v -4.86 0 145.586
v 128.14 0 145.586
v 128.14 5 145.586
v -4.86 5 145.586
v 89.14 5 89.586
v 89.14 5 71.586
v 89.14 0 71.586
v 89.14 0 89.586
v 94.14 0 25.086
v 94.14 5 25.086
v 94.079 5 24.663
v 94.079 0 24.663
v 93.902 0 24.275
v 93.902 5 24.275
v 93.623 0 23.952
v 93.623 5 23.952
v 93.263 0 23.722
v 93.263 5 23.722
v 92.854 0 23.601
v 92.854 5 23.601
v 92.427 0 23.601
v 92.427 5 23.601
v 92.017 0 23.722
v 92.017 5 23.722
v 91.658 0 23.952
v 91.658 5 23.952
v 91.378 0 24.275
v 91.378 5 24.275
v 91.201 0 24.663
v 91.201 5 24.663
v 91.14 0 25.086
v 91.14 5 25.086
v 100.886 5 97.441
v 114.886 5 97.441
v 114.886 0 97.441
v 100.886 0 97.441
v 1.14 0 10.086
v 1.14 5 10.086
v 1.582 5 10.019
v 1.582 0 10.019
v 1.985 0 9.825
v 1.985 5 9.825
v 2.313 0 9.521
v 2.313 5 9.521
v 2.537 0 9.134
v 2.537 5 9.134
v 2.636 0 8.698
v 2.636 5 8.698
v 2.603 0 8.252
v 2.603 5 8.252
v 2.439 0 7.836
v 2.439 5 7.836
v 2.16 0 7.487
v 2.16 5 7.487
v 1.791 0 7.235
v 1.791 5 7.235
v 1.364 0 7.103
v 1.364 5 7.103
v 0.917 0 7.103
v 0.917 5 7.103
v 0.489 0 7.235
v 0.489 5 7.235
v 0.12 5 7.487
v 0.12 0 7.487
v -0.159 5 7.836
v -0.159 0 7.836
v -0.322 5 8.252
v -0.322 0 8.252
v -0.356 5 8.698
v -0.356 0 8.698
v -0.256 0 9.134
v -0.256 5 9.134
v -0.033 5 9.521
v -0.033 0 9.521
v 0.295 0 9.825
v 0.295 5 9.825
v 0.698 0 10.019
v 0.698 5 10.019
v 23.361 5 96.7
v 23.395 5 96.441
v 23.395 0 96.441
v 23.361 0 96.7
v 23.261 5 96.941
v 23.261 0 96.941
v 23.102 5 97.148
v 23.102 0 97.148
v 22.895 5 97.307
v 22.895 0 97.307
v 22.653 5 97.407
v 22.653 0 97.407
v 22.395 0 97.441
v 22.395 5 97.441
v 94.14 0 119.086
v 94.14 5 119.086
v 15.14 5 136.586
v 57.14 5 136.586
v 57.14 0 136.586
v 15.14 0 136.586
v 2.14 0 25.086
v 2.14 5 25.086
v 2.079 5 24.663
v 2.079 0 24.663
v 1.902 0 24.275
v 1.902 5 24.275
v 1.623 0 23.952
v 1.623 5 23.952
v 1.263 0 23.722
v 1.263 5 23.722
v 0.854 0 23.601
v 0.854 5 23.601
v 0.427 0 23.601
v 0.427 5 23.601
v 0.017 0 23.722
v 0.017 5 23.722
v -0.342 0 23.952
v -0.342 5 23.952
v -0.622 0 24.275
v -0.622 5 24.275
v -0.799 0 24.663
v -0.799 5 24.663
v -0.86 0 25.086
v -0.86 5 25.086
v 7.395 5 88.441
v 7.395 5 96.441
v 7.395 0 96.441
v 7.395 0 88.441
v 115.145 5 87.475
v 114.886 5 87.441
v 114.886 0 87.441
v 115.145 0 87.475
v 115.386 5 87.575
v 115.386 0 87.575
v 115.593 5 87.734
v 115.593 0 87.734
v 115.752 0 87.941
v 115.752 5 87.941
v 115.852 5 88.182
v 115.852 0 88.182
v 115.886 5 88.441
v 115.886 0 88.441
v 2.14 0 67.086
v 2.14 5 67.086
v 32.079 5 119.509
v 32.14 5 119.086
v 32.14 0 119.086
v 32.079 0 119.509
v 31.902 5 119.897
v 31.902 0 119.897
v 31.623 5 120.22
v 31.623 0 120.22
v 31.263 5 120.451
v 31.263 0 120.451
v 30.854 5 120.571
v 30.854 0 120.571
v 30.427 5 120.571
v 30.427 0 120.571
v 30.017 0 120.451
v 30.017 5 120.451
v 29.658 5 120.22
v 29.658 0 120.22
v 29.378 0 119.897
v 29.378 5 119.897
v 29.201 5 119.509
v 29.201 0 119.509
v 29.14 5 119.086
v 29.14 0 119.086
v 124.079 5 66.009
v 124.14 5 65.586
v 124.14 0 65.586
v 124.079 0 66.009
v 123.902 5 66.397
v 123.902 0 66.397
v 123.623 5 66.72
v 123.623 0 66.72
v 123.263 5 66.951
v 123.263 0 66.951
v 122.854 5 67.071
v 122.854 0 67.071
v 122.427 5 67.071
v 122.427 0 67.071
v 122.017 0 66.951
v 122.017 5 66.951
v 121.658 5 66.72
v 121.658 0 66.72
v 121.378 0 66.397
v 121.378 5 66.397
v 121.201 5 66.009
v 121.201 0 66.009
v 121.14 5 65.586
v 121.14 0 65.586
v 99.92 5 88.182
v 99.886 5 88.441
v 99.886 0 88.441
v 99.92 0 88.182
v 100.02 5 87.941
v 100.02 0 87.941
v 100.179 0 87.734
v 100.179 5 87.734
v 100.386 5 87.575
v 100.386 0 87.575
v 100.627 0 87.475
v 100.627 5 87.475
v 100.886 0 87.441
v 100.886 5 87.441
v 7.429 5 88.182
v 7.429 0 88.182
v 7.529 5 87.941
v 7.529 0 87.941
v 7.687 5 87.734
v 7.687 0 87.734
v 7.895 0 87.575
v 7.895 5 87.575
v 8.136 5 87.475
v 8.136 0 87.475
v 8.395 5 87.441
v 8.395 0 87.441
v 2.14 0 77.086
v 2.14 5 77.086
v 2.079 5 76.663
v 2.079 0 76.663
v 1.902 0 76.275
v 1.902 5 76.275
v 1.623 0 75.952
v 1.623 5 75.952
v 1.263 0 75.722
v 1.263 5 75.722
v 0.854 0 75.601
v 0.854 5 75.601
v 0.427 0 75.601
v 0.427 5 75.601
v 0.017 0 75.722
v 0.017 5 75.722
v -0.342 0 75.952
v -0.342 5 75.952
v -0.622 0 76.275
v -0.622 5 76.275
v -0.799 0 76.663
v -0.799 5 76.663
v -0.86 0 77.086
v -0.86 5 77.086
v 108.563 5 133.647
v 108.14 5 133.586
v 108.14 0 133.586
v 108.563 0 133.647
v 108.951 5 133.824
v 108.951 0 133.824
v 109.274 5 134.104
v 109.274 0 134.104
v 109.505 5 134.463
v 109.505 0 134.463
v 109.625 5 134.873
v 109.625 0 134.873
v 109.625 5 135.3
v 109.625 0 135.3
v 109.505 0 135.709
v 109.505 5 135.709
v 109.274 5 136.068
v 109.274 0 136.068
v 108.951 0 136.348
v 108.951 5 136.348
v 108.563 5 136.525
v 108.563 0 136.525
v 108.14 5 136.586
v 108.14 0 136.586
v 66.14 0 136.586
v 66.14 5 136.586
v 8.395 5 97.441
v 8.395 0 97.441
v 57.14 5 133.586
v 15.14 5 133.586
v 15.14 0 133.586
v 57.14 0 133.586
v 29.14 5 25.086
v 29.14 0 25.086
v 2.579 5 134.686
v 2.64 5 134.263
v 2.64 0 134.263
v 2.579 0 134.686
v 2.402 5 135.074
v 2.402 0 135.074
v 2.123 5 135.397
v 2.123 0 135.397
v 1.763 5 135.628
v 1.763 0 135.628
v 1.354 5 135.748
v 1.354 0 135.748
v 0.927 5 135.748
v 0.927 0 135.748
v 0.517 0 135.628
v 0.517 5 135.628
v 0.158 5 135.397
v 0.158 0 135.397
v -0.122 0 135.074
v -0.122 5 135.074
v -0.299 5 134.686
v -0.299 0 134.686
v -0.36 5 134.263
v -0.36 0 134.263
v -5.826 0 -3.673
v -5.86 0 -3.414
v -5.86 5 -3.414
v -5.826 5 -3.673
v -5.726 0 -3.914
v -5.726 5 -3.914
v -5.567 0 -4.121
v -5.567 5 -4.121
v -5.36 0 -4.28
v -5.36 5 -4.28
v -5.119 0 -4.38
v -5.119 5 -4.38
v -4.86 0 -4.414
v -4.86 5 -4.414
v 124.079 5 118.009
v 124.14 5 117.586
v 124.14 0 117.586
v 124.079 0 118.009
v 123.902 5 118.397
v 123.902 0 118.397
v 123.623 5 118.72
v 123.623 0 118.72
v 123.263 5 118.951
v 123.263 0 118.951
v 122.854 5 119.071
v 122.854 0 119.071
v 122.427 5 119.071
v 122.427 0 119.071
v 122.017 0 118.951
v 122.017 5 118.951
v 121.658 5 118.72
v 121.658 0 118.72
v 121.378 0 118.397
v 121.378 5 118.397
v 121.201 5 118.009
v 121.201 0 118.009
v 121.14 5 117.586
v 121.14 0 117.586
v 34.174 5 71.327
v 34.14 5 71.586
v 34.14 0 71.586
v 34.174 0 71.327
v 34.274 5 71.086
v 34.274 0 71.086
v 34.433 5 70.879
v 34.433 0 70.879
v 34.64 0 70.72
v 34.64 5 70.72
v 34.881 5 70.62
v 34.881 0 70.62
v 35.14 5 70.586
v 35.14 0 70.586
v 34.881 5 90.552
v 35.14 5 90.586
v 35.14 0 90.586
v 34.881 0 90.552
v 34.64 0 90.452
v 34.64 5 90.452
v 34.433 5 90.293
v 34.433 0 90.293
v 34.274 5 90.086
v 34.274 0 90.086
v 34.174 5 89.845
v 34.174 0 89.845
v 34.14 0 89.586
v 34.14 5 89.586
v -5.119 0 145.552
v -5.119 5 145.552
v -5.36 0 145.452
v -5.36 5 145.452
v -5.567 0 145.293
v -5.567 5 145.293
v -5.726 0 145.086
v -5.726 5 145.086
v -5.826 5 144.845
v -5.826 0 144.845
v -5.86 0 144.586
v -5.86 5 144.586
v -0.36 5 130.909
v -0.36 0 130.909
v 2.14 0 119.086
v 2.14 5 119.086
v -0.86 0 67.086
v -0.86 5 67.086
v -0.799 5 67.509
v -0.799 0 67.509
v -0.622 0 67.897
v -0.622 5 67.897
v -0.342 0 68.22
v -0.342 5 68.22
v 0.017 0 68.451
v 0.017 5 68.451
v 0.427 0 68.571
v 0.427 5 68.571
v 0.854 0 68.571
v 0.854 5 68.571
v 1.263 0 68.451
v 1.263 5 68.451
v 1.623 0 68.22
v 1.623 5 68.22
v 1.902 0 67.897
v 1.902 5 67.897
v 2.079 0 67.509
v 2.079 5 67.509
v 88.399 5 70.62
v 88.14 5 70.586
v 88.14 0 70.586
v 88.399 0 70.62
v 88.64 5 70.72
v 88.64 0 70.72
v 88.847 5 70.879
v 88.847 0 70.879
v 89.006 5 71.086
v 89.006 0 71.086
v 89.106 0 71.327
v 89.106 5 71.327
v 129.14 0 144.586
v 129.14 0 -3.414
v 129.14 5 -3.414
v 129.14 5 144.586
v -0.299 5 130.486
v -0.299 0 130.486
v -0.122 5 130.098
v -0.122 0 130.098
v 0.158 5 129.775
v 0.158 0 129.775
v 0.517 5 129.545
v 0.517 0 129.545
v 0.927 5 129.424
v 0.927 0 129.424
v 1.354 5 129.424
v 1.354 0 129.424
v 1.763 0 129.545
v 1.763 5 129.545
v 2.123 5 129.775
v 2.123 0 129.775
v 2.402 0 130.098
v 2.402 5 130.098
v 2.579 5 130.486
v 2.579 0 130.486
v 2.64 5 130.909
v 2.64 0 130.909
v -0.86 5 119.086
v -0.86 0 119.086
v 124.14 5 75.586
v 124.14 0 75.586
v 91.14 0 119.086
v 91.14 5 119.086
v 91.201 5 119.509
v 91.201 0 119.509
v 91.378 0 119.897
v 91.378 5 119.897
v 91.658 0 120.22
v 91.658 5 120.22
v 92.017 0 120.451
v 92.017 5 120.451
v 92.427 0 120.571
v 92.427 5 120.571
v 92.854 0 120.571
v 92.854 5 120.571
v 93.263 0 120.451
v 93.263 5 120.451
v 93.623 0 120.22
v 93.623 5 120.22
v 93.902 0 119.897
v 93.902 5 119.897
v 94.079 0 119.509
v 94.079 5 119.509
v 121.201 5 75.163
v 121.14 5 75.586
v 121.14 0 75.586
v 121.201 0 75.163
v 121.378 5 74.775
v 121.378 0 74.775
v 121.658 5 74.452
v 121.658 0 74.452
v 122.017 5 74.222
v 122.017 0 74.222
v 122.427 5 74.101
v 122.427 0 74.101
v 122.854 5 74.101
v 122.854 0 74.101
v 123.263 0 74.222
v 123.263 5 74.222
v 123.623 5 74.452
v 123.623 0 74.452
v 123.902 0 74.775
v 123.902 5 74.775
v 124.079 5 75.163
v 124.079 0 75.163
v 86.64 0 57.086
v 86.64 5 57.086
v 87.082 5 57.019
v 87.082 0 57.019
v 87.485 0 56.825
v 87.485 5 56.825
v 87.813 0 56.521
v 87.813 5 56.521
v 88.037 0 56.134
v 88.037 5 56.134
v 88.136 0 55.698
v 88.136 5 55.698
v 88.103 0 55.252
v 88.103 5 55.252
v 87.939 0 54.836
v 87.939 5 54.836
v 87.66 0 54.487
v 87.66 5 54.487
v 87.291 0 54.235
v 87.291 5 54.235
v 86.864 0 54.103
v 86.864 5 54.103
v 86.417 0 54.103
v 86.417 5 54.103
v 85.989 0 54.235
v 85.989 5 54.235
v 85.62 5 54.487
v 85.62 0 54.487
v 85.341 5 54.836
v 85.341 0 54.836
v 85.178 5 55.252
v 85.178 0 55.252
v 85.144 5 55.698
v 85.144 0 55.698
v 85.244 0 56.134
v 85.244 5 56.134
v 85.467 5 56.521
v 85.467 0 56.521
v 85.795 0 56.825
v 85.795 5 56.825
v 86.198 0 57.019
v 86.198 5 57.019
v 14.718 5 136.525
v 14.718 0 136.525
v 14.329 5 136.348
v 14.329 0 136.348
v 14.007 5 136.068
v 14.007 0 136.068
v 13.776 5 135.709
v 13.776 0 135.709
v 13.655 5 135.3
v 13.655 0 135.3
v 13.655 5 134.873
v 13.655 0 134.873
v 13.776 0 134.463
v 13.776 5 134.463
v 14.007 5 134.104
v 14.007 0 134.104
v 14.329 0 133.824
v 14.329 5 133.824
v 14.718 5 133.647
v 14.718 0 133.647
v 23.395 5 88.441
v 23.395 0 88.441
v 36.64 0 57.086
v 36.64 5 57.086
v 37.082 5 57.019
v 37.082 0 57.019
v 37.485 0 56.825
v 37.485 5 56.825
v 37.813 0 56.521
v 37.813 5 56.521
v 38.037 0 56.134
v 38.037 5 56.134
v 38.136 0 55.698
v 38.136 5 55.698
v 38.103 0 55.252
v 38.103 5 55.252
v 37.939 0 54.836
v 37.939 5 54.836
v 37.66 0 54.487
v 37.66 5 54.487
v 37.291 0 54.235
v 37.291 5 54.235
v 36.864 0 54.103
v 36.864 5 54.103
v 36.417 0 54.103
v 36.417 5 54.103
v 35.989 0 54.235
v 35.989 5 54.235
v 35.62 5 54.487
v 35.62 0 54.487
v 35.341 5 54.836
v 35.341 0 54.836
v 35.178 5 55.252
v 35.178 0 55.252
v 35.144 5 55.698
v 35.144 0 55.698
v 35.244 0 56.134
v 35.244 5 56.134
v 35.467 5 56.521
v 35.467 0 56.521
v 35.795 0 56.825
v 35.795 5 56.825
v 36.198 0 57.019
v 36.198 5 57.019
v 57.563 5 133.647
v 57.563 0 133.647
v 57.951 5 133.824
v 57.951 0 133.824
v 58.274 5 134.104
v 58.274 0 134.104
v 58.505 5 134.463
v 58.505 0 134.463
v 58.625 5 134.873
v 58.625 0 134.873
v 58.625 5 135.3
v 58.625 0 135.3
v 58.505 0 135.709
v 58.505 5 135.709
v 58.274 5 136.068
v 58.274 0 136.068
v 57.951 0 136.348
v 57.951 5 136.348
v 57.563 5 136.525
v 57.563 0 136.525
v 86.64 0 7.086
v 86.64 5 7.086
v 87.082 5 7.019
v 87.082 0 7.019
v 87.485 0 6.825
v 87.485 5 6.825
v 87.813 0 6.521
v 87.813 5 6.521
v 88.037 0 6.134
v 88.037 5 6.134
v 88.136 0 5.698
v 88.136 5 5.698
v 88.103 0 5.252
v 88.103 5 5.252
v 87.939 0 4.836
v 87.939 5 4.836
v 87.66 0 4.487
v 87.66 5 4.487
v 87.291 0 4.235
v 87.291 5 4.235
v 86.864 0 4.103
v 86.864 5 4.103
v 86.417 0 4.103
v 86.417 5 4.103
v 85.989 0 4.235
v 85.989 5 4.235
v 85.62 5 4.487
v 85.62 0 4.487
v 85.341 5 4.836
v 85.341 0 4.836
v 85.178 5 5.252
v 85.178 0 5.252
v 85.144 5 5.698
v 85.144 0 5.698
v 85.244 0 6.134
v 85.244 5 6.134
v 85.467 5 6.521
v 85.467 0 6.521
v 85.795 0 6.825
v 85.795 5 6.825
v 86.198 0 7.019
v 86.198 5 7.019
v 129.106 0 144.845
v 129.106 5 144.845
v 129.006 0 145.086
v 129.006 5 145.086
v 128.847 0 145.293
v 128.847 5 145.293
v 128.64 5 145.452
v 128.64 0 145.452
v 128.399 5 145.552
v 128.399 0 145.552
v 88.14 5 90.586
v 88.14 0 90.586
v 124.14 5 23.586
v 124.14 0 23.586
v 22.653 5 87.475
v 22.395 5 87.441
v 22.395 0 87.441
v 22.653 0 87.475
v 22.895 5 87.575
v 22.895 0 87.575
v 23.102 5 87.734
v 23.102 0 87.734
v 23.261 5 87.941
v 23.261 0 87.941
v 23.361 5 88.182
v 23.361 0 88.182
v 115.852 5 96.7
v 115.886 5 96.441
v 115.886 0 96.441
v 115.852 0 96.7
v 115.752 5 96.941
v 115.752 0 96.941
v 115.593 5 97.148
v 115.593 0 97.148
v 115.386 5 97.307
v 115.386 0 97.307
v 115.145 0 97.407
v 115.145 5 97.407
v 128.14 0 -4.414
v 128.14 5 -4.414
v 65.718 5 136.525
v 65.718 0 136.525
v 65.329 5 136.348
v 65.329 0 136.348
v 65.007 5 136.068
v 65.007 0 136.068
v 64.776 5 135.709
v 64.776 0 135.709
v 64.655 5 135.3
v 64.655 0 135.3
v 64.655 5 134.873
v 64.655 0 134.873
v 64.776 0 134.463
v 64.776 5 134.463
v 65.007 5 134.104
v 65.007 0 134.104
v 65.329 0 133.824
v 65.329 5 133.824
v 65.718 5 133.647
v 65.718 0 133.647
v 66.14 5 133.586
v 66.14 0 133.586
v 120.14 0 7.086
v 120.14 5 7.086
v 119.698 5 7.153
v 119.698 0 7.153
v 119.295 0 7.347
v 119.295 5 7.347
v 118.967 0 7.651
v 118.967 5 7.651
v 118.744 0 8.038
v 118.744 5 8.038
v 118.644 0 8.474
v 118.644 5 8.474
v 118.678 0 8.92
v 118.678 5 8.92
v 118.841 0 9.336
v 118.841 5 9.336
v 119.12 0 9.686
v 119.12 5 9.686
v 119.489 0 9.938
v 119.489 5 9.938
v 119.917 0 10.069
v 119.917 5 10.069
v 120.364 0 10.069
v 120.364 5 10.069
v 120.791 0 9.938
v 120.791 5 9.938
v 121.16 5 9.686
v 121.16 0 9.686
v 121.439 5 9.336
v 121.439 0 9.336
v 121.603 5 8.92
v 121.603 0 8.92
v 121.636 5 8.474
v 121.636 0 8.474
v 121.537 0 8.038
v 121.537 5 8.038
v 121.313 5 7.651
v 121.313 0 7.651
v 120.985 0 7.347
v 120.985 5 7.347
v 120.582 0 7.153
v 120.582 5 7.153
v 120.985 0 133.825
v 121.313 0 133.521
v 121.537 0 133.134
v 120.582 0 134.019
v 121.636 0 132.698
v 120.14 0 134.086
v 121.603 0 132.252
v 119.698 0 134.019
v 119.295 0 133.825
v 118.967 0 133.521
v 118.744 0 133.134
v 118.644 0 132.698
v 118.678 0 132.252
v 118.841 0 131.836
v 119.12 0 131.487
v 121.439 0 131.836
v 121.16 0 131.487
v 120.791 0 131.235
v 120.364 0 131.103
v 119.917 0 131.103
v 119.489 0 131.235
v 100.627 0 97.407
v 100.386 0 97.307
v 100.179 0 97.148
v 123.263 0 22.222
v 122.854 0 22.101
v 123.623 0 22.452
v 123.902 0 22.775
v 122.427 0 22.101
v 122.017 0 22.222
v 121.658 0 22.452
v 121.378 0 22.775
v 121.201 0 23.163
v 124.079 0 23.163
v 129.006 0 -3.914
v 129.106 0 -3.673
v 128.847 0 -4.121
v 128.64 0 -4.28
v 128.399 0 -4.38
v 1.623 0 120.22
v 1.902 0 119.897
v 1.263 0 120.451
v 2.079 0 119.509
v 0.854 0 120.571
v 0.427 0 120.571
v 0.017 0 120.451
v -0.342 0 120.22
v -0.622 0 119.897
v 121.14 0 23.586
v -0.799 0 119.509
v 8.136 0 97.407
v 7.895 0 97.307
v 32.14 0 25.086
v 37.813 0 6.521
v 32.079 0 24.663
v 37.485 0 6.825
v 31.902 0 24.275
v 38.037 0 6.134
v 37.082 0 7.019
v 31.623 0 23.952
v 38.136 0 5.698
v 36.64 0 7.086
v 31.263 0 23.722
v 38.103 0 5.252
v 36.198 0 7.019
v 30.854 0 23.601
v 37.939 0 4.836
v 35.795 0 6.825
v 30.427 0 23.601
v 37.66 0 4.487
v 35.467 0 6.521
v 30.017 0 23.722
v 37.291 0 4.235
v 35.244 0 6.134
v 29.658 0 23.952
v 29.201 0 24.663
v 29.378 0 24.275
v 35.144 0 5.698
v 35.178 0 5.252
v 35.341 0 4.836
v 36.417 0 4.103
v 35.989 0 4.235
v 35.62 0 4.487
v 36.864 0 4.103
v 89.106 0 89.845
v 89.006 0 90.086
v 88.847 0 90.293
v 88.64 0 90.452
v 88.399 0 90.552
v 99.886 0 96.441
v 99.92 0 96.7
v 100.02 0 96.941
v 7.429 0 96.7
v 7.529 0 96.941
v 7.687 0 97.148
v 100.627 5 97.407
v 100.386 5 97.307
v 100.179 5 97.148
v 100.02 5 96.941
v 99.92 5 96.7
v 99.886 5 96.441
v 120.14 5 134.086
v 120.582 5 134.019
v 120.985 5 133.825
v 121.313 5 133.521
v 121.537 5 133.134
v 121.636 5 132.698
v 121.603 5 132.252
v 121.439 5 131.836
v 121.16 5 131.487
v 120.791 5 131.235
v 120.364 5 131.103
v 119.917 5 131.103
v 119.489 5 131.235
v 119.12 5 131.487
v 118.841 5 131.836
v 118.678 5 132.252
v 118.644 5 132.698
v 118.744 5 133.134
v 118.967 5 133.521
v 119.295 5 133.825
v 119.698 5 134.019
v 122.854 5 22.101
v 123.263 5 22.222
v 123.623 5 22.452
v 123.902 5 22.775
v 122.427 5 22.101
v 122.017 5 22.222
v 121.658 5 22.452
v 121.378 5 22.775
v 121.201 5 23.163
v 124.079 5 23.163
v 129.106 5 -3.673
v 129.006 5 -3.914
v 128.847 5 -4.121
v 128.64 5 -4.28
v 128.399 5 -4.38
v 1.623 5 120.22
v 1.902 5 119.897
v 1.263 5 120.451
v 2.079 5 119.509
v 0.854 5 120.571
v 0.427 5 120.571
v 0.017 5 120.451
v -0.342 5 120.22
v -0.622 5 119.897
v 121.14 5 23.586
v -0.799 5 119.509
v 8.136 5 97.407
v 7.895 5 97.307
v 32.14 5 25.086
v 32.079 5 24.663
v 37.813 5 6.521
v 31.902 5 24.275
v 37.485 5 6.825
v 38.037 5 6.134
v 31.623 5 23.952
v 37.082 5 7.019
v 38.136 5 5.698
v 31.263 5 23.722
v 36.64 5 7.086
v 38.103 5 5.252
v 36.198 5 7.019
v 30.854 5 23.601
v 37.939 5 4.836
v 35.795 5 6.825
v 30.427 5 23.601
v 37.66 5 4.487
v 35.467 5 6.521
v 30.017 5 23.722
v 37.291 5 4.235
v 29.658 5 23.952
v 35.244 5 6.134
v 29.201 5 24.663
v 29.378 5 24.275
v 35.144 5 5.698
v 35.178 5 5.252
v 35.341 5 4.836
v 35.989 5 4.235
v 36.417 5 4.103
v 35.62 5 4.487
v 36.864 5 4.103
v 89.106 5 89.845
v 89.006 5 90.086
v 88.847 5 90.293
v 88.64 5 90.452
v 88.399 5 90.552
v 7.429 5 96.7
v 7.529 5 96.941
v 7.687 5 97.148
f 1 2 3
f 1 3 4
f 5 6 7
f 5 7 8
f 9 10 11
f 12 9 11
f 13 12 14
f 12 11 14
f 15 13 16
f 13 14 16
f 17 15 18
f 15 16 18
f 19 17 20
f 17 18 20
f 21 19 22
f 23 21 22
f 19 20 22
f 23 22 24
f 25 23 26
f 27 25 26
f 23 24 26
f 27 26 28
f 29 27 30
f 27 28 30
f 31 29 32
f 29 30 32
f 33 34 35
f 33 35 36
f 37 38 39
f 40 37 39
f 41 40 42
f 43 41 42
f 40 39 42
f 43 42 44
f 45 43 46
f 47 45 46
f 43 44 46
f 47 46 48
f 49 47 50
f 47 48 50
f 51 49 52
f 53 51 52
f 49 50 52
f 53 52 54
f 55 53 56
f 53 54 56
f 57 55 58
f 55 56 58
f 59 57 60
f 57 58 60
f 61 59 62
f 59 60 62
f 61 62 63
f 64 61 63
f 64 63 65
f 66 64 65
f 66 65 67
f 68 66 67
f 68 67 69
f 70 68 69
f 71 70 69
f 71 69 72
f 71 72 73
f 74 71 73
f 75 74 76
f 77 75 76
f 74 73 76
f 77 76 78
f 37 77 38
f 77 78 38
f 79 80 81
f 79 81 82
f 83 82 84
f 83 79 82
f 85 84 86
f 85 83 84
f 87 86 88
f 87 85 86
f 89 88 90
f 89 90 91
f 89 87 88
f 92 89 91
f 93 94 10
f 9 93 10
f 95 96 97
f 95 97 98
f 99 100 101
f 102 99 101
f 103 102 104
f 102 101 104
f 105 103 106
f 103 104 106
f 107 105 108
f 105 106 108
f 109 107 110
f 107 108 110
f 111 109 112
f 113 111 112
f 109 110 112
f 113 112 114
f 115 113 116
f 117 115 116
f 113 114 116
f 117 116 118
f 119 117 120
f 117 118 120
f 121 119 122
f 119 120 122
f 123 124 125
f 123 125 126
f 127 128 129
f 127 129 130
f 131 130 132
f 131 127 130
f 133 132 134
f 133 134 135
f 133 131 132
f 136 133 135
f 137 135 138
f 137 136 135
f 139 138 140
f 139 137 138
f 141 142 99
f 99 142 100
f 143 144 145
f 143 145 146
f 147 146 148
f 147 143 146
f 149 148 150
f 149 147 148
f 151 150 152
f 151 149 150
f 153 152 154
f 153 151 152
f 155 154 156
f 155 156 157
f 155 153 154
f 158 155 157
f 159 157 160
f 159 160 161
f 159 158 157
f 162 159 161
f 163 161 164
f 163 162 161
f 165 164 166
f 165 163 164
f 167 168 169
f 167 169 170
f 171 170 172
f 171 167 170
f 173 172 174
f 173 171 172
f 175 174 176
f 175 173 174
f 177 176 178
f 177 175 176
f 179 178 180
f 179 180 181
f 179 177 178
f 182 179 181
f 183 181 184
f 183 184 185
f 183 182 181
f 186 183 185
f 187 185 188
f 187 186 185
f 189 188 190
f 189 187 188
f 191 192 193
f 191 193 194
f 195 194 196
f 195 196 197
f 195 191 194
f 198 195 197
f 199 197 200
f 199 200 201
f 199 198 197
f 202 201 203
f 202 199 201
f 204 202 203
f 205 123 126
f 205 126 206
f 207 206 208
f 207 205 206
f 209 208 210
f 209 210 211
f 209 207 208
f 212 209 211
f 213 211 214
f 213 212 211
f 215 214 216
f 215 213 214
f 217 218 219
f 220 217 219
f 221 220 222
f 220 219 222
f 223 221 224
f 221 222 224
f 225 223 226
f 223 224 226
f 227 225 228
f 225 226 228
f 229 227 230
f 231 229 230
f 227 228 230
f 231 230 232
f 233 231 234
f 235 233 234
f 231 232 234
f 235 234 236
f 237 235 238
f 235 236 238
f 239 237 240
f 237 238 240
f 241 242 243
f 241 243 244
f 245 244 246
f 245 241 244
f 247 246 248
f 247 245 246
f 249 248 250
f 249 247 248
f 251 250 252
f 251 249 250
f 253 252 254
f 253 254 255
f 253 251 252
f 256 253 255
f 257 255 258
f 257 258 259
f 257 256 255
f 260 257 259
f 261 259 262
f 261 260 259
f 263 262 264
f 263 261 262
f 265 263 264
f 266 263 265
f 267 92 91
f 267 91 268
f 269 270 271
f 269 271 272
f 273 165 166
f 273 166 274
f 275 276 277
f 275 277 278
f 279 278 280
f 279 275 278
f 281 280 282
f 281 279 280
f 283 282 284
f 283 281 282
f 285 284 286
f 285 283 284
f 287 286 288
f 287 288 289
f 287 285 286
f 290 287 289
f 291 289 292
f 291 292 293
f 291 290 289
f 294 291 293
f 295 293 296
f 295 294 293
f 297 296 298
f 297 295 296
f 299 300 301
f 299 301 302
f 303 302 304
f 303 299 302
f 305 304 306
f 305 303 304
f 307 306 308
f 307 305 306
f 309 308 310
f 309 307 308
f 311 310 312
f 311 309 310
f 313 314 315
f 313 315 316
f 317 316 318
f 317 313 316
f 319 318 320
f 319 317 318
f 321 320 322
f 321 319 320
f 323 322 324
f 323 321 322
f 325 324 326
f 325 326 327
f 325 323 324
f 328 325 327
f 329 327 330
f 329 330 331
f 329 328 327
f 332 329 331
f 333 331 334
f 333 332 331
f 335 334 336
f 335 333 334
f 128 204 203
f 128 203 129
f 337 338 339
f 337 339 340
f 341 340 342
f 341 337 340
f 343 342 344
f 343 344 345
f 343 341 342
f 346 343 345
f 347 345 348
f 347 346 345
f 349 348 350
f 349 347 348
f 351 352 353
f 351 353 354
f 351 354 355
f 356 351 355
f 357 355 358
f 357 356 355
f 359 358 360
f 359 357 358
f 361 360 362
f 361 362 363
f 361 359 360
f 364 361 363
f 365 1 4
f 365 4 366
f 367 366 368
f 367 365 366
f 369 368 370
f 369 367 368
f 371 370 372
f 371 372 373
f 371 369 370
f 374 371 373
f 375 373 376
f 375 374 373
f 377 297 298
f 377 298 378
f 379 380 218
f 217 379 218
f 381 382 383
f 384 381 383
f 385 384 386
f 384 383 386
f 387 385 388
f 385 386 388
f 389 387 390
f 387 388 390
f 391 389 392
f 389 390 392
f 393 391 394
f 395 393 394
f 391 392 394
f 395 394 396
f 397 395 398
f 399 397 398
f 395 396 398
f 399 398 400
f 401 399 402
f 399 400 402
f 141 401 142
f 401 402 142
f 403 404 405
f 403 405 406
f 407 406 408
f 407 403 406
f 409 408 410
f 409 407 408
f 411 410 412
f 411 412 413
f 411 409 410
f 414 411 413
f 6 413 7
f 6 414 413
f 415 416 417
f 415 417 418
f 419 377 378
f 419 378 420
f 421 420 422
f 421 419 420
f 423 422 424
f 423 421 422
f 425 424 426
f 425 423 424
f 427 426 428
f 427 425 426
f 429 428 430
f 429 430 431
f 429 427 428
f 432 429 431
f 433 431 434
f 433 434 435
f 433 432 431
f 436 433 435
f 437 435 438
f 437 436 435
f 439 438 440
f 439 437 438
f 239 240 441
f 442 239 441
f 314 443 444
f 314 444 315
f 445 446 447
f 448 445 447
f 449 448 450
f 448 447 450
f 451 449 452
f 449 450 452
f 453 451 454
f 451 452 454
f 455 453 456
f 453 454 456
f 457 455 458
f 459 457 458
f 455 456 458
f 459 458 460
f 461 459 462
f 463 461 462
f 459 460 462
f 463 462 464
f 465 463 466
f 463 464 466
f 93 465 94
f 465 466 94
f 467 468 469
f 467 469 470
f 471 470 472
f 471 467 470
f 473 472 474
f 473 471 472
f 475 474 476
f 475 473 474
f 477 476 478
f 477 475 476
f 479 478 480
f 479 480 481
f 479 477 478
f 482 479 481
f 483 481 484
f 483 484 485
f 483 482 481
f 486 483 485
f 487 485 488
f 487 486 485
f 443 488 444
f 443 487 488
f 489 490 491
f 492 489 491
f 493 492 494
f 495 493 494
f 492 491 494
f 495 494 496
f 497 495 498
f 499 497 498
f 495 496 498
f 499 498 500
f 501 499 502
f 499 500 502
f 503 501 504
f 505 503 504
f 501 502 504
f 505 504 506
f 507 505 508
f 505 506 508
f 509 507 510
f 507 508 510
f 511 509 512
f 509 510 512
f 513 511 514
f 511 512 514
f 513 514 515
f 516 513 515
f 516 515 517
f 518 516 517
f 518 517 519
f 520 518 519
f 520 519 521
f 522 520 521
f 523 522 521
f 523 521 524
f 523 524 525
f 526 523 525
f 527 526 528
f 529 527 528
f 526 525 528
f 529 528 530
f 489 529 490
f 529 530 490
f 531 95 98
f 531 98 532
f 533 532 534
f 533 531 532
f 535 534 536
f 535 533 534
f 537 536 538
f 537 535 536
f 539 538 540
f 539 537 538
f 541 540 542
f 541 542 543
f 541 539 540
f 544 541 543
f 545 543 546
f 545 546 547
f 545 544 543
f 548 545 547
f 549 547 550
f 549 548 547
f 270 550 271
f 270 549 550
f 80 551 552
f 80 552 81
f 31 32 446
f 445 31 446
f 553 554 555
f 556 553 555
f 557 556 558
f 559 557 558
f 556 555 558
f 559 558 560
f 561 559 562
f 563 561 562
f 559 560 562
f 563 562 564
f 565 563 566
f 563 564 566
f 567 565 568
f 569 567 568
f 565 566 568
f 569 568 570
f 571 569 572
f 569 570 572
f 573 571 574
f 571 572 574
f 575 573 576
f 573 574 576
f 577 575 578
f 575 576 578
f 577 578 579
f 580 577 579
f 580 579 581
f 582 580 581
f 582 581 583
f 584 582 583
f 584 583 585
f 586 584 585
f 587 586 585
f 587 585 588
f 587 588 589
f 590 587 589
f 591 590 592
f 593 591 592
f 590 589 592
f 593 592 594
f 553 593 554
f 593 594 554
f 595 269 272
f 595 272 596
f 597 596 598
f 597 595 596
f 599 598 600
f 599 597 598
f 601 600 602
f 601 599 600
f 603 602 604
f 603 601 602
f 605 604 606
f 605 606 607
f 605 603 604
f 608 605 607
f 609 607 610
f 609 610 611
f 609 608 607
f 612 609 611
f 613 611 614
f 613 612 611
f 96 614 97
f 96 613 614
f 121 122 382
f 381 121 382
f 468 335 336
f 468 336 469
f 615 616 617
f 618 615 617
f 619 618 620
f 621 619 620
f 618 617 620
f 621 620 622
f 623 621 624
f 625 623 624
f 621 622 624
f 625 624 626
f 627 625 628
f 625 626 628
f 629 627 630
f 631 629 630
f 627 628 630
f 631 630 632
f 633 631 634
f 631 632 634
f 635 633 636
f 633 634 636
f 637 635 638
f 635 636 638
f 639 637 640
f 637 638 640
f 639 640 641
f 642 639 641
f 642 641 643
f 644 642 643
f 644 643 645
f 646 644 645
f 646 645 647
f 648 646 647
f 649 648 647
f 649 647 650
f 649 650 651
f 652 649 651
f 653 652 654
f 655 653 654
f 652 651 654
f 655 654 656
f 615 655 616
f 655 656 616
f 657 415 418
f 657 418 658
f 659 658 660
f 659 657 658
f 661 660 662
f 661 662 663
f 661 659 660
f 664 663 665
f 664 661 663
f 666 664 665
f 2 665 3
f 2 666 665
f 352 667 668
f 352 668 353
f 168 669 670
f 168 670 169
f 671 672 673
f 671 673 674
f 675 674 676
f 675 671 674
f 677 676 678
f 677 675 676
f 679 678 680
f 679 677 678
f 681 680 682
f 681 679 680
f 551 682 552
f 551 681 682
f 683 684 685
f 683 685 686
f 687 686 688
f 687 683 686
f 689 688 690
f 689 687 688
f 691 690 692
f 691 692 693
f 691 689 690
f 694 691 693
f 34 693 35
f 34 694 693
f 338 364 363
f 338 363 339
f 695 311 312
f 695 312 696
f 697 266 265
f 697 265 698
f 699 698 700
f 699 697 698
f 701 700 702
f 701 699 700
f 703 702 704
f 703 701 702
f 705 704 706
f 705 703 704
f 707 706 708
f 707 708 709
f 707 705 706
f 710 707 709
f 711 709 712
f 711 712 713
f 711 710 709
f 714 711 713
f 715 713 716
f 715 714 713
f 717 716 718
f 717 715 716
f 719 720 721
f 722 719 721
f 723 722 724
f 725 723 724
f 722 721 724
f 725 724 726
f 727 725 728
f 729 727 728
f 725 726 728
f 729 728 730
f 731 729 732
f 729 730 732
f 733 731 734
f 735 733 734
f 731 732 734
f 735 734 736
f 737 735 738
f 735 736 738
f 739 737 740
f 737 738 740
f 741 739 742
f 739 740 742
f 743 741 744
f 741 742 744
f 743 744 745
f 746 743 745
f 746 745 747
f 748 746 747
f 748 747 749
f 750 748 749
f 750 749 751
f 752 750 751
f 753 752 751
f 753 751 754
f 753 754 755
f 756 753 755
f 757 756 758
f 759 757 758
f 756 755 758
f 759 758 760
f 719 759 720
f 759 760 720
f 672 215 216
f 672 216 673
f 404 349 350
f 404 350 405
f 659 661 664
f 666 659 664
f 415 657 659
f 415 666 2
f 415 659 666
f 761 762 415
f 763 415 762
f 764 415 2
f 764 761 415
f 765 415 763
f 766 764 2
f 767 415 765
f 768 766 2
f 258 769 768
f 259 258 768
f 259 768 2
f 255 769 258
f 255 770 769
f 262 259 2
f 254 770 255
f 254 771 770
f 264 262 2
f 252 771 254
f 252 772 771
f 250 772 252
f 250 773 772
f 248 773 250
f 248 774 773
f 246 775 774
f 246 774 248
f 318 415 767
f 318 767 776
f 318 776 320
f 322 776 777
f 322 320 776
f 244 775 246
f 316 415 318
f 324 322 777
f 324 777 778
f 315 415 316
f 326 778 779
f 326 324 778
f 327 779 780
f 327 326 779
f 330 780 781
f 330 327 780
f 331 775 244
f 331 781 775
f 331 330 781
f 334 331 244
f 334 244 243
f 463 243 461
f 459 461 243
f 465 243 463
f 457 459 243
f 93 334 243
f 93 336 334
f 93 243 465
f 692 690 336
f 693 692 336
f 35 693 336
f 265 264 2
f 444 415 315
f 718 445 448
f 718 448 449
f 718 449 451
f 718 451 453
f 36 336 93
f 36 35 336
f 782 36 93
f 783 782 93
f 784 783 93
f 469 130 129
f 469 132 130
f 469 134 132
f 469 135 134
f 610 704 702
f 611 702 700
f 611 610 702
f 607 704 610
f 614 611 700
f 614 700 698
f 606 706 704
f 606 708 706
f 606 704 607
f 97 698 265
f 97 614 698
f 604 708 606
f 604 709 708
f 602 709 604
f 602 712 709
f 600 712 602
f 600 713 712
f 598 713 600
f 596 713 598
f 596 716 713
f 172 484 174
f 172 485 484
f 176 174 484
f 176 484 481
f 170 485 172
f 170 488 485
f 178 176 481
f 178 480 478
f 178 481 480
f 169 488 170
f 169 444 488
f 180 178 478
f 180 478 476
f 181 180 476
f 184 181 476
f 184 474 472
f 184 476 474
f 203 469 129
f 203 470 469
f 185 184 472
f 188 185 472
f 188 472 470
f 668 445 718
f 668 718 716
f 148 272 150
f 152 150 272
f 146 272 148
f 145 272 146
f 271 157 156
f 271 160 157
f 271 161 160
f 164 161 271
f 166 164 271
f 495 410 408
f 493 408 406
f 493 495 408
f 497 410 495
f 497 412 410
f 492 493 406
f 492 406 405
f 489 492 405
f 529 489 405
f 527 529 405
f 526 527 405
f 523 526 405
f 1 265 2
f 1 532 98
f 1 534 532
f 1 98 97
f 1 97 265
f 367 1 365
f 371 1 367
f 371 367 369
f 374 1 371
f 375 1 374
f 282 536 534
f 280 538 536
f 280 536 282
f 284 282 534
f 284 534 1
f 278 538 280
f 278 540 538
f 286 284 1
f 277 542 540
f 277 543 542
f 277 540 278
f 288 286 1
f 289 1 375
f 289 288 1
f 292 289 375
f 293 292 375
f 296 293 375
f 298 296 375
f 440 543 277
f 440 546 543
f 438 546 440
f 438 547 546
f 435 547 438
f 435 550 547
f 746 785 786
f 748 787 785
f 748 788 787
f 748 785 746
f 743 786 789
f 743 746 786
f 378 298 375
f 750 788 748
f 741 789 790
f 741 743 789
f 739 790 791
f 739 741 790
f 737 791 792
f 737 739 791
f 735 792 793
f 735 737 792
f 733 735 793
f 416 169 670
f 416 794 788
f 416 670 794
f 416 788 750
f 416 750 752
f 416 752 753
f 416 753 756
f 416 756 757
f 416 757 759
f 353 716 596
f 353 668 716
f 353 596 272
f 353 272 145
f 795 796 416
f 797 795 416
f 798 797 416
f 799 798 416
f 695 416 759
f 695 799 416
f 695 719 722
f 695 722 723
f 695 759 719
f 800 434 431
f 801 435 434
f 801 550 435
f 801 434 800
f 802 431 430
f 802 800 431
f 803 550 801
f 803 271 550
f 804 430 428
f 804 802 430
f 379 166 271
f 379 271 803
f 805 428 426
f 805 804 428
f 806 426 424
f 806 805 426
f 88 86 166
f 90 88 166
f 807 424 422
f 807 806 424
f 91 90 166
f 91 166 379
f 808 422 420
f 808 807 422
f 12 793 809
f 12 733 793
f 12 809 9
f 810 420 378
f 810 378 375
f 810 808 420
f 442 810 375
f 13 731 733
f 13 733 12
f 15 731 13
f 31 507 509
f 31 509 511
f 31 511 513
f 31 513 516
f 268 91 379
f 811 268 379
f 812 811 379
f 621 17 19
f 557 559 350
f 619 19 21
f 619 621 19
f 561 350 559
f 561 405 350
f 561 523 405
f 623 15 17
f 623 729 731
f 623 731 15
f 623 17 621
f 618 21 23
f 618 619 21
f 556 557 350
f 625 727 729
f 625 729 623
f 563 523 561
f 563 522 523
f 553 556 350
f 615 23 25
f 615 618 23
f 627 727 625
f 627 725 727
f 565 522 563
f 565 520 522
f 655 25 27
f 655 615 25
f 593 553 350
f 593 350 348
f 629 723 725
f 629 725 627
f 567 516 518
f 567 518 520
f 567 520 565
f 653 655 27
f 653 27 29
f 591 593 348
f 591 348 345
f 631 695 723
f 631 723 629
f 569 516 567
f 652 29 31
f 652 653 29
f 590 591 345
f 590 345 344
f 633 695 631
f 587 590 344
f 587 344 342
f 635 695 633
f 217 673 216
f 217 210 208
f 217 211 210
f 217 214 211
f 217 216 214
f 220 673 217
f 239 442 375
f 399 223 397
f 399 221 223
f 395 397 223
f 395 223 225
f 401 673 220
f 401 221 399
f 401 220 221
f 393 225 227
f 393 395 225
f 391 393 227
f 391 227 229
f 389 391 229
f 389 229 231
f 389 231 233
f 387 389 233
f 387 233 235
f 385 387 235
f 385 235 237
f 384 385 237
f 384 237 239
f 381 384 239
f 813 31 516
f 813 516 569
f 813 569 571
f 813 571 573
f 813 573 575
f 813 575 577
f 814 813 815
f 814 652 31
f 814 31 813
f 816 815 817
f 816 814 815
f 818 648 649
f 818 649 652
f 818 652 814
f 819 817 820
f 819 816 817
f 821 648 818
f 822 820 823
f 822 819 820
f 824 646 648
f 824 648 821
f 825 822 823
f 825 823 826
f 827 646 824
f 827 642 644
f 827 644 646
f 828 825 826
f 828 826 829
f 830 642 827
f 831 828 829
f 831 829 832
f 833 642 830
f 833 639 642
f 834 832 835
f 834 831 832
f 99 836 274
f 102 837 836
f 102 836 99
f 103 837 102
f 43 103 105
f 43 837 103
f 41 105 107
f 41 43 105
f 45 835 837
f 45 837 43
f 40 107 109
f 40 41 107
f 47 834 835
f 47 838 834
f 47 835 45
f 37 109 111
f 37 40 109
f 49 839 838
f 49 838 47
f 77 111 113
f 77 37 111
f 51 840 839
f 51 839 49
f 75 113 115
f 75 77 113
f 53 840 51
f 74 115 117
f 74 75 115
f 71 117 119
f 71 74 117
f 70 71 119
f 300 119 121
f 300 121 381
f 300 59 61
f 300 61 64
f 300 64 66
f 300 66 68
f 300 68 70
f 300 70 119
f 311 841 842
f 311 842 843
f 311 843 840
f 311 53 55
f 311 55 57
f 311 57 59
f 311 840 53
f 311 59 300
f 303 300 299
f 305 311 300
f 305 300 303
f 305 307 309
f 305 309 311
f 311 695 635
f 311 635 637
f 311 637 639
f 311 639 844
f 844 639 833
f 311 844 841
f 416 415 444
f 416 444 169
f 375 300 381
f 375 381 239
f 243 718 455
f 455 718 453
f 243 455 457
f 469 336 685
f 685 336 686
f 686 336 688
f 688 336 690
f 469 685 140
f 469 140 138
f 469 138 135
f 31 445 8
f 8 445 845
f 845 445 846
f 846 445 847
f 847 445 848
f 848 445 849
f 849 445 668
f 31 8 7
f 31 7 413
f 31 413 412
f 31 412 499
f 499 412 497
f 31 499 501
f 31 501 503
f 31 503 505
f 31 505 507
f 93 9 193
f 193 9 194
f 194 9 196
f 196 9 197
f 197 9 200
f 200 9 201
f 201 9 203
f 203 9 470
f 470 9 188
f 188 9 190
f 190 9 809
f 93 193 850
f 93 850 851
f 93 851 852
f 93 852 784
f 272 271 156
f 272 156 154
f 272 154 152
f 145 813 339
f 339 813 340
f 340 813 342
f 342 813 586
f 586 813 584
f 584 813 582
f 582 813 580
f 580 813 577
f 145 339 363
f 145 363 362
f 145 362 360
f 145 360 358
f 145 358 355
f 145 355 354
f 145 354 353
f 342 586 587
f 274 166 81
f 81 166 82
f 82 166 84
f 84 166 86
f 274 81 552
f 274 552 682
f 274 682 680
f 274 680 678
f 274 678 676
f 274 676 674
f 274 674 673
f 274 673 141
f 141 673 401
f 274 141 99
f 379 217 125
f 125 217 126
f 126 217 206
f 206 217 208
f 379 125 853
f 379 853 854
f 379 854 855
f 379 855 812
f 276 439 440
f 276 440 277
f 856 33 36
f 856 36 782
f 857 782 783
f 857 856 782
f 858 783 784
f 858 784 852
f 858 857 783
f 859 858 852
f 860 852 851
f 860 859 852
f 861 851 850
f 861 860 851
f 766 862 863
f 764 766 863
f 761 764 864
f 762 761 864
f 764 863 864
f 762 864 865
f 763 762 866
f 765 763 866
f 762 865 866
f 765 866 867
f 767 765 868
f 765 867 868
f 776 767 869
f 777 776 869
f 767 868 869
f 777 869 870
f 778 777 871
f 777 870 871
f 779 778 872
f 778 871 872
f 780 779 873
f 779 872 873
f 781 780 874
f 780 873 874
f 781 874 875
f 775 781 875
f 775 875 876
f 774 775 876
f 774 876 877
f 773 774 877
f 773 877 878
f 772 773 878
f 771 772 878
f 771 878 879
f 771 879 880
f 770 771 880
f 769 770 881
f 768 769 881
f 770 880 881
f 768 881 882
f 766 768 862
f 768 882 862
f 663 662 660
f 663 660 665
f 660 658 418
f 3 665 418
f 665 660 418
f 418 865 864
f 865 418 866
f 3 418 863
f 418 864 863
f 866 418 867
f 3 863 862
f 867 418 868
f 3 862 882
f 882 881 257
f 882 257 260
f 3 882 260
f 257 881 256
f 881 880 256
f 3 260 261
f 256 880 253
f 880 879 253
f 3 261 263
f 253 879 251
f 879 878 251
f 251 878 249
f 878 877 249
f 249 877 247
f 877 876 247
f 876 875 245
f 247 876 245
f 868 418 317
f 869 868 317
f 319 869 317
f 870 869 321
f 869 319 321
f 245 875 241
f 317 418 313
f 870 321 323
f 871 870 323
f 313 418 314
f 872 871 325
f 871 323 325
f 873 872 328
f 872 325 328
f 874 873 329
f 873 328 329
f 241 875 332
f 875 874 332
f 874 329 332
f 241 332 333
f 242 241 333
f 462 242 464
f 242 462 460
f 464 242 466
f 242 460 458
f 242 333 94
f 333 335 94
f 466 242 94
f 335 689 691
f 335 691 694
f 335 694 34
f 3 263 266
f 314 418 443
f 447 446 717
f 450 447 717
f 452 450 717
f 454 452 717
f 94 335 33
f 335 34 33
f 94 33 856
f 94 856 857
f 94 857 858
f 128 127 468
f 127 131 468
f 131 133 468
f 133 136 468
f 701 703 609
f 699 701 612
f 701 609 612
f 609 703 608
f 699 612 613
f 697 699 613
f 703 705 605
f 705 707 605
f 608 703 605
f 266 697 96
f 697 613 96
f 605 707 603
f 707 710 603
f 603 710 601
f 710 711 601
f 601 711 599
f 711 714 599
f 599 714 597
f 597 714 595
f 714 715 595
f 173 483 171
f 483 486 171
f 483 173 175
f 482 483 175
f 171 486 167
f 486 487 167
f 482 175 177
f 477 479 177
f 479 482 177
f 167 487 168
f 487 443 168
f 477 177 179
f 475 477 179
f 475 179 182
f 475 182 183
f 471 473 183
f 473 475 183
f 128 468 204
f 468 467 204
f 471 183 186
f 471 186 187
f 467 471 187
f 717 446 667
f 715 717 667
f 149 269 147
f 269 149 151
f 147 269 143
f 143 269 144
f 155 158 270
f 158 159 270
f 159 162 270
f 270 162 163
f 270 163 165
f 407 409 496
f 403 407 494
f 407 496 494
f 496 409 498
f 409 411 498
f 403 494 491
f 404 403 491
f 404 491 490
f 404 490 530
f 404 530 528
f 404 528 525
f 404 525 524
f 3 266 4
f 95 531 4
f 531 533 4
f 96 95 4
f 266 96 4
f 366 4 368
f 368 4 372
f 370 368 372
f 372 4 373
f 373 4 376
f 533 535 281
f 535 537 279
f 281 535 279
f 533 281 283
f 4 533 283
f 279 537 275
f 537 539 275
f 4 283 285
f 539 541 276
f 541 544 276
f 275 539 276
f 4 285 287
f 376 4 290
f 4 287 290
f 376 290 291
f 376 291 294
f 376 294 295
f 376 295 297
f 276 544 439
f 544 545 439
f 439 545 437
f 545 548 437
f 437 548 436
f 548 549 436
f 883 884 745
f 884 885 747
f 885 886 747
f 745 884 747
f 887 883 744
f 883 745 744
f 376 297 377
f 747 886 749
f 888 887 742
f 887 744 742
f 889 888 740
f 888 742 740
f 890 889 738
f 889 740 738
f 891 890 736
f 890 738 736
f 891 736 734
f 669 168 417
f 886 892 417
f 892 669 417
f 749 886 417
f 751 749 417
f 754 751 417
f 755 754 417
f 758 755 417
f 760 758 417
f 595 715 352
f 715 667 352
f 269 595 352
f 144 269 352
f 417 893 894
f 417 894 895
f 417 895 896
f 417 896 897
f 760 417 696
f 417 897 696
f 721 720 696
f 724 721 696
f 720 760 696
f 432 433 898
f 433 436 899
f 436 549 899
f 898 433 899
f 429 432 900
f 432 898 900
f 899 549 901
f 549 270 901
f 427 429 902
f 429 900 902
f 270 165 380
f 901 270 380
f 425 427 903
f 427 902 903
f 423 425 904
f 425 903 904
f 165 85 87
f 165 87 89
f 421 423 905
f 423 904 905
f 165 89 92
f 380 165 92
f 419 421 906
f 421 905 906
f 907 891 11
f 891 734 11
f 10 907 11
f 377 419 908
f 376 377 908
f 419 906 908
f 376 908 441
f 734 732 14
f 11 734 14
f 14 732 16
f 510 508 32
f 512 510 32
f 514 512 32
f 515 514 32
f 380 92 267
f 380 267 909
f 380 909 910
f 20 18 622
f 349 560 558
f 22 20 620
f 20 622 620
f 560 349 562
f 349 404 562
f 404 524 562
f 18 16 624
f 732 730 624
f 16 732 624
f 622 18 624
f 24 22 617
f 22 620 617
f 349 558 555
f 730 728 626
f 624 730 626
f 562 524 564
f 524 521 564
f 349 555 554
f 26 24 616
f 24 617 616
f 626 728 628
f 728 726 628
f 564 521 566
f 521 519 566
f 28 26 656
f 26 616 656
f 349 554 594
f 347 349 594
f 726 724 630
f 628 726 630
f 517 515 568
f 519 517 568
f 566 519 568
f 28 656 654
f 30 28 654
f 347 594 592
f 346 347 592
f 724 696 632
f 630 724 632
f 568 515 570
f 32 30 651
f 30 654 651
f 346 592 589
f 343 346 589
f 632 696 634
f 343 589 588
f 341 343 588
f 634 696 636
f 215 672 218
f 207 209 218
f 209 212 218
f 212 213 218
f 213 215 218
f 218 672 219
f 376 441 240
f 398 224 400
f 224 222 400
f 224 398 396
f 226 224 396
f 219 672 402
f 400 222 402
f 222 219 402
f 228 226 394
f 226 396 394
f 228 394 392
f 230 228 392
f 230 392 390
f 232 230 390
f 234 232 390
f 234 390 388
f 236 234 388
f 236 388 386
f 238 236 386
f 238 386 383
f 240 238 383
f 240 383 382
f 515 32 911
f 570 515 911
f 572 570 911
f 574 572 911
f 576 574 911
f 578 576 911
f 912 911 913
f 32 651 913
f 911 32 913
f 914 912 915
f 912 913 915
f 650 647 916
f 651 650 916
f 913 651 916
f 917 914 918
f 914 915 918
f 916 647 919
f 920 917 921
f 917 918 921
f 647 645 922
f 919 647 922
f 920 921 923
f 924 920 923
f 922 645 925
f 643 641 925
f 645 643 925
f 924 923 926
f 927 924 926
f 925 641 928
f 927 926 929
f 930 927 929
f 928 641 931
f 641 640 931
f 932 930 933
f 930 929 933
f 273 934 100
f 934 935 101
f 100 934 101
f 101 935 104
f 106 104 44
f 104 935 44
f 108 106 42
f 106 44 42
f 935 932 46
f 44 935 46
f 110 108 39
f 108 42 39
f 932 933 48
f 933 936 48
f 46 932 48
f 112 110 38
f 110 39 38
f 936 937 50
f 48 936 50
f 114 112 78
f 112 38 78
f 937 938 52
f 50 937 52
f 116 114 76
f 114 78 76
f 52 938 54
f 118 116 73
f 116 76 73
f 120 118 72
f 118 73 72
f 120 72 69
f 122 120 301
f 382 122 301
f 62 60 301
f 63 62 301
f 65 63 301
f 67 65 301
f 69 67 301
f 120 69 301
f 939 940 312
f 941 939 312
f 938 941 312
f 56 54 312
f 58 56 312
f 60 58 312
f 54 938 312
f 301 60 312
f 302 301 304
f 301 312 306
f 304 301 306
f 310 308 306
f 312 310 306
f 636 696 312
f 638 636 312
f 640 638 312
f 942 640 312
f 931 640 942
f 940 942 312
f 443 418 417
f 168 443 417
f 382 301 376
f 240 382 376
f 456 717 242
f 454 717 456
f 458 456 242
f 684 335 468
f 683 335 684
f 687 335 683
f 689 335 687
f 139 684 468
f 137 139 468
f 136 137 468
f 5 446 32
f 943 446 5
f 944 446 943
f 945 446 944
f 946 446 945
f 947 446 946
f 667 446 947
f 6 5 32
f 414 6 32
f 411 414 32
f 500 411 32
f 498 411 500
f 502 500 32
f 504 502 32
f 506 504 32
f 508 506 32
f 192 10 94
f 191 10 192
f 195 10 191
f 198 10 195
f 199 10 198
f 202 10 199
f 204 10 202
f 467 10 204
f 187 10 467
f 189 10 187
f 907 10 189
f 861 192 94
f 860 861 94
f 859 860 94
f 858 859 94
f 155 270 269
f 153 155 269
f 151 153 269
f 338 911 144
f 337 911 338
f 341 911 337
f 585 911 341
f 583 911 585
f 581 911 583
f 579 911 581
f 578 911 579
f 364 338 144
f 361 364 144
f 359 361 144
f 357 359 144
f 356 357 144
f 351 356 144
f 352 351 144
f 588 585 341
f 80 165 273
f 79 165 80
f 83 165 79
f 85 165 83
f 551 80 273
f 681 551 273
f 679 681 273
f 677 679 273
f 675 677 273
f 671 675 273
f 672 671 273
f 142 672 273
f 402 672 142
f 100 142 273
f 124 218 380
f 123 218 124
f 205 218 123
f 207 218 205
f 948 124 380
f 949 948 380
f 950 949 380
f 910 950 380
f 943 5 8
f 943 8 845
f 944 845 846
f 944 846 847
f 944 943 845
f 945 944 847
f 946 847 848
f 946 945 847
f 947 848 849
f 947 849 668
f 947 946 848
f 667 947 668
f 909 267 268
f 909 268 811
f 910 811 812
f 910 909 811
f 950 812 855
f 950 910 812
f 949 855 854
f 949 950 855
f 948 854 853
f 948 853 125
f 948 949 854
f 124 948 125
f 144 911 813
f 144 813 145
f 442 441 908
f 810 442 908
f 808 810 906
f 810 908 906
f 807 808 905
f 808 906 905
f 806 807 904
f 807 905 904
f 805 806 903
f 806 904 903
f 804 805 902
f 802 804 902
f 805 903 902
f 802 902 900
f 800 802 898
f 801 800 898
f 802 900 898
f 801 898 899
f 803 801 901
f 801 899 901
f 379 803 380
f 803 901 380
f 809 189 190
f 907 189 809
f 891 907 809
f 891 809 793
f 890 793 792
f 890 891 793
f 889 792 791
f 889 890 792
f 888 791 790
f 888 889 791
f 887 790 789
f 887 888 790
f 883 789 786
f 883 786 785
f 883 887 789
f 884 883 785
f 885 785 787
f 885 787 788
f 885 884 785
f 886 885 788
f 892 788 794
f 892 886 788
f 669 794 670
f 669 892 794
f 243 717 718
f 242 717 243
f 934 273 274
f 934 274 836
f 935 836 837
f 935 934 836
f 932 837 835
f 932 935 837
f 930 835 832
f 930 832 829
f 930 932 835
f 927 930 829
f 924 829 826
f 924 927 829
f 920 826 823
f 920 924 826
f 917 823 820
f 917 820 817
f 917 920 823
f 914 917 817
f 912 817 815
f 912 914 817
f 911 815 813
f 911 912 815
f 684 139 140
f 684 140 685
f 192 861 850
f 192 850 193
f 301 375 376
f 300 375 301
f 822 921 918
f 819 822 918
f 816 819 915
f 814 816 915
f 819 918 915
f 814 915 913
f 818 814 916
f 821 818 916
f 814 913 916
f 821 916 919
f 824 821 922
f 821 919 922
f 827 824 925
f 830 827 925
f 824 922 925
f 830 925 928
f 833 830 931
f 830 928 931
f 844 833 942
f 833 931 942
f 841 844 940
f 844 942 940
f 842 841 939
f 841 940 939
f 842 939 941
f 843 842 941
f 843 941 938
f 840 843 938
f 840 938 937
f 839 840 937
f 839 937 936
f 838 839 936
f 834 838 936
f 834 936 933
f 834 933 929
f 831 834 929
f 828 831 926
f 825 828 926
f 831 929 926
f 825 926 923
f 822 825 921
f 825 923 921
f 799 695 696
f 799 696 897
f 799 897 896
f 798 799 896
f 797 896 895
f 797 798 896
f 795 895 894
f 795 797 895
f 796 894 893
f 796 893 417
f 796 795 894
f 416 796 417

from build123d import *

# Parameters (mm, degrees)
BOSS_EXTRUDE1_DEPTH = 5
CUT_EXTRUDE1_DEPTH  = 5
CUT_EXTRUDE2_DEPTH  = 5
SKETCH7_R           = 1.5
CUT_EXTRUDE3_DEPTH  = 5
CUT_EXTRUDE4_DEPTH  = 5
SKETCH10_R          = 1.5
CUT_EXTRUDE5_DEPTH  = 5
CUT_EXTRUDE6_DEPTH  = 5
CUT_EXTRUDE7_DEPTH  = 5


with BuildPart() as part:
    # Sketch1 → Boss-Extrude1 (new body)
    with BuildSketch(Plane(origin=(0, 0, 0), x_dir=(1, 0, 0), z_dir=(0, 1, 0))):
        with BuildLine():
            Line((-4.859778007, 4.413916891), (128.140221993, 4.413916891))
            ThreePointArc((128.140221993, 4.413916891), (128.847328775, 4.121023672), (129.140221993, 3.413916891))
            Line((129.140221993, 3.413916891), (129.140221993, -144.586083109))
            ThreePointArc((129.140221993, -144.586083109), (128.847328775, -145.29318989), (128.140221993, -145.586083109))
            Line((128.140221993, -145.586083109), (-4.859778007, -145.586083109))
            ThreePointArc((-4.859778007, -145.586083109), (-5.566884788, -145.29318989), (-5.859778007, -144.586083109))
            Line((-5.859778007, -144.586083109), (-5.859778007, 3.413916891))
            ThreePointArc((-5.859778007, 3.413916891), (-5.566884788, 4.121023672), (-4.859778007, 4.413916891))
        make_face()
    extrude(amount=BOSS_EXTRUDE1_DEPTH)

    # Sketch3 → Cut-Extrude1 (cut)
    with BuildSketch(Plane(origin=(75.20450804, 5, 34.196611672), x_dir=(1, 0, 0), z_dir=(0, 1, 0))):
        with BuildLine():
            Line((45.935713953, -83.389471436), (45.935713953, -41.389471436))
            ThreePointArc((45.935713953, -41.389471436), (47.435713953, -39.889471436), (48.935713953, -41.389471436))
            Line((48.935713953, -41.389471436), (48.935713953, -83.389471436))
            ThreePointArc((48.935713953, -83.389471436), (47.435713953, -84.889471436), (45.935713953, -83.389471436))
        make_face()
        with BuildLine():
            Line((45.935713953, -31.389471436), (45.935713953, 10.610528564))
            ThreePointArc((45.935713953, 10.610528564), (47.435713953, 12.110528564), (48.935713953, 10.610528564))
            Line((48.935713953, 10.610528564), (48.935713953, -31.389471436))
            ThreePointArc((48.935713953, -31.389471436), (47.435713953, -32.889471436), (45.935713953, -31.389471436))
        make_face()
        with BuildLine():
            Line((-73.064286047, -84.889471436), (-73.064286047, -42.889471436))
            ThreePointArc((-73.064286047, -42.889471436), (-74.564286047, -41.389471436), (-76.064286047, -42.889471436))
            Line((-76.064286047, -42.889471436), (-76.064286047, -84.889471436))
            ThreePointArc((-76.064286047, -84.889471436), (-74.564286047, -86.389471436), (-73.064286047, -84.889471436))
        make_face()
        with BuildLine():
            Line((-73.064286047, -32.889471436), (-73.064286047, 9.110528564))
            ThreePointArc((-73.064286047, 9.110528564), (-74.564286047, 10.610528564), (-76.064286047, 9.110528564))
            Line((-76.064286047, 9.110528564), (-76.064286047, -32.889471436))
            ThreePointArc((-76.064286047, -32.889471436), (-74.564286047, -34.389471436), (-73.064286047, -32.889471436))
        make_face()
    extrude(amount=-CUT_EXTRUDE1_DEPTH, mode=Mode.SUBTRACT)

    # Sketch5 → Cut-Extrude2 (cut)
    with BuildSketch(Plane(origin=(75.20450804, 5, 34.196611672), x_dir=(1, 0, 0), z_dir=(0, 1, 0))):
        with BuildLine():
            Line((-60.064286047, -99.389471436), (-18.064286047, -99.389471436))
            ThreePointArc((-18.064286047, -99.389471436), (-16.564286047, -100.889471436), (-18.064286047, -102.389471436))
            Line((-18.064286047, -102.389471436), (-60.064286047, -102.389471436))
            ThreePointArc((-60.064286047, -102.389471436), (-61.564286047, -100.889471436), (-60.064286047, -99.389471436))
        make_face()
        with BuildLine():
            Line((-9.064286047, -99.389471436), (32.935713953, -99.389471436))
            ThreePointArc((32.935713953, -99.389471436), (34.435713953, -100.889471436), (32.935713953, -102.389471436))
            Line((32.935713953, -102.389471436), (-9.064286047, -102.389471436))
            ThreePointArc((-9.064286047, -102.389471436), (-10.564286047, -100.889471436), (-9.064286047, -99.389471436))
        make_face()
    extrude(amount=-CUT_EXTRUDE2_DEPTH, mode=Mode.SUBTRACT)

    # Sketch7 → Cut-Extrude3 (cut)
    with BuildSketch(Plane(origin=(75.20450804, 5, 34.196611672), x_dir=(1, 0, 0), z_dir=(0, 1, 0))):
        with Locations(Location((44.935713953, -98.389471436, 0), (0, 0, 270))):
            Circle(SKETCH7_R)
        with Locations(Location((44.935713953, 25.610528564, 0), (0, 0, 90))):
            Circle(SKETCH7_R)
        with Locations(Location((-74.064286047, 25.610528564, 0), (0, 0, 270))):
            Circle(SKETCH7_R)
        with BuildLine():
            Line((-72.564286047, -96.712473991), (-72.564286047, -100.066468882))
            ThreePointArc((-72.564286047, -100.066468882), (-74.064286047, -101.566468882), (-75.564286047, -100.066468882))
            Line((-75.564286047, -100.066468882), (-75.564286047, -96.712473991))
            ThreePointArc((-75.564286047, -96.712473991), (-74.064286047, -95.212473991), (-72.564286047, -96.712473991))
        make_face()
    extrude(amount=-CUT_EXTRUDE3_DEPTH, mode=Mode.SUBTRACT)

    # Sketch9 → Cut-Extrude4 (cut)
    with BuildSketch(Plane(origin=(75.20450804, 5, 34.196611672), x_dir=(1, 0, 0), z_dir=(0, 1, 0))):
        with BuildLine():
            Line((-40.064286047, -36.389471436), (12.935713953, -36.389471436))
            ThreePointArc((12.935713953, -36.389471436), (13.642820734, -36.682364655), (13.935713953, -37.389471436))
            Line((13.935713953, -37.389471436), (13.935713953, -55.389471436))
            ThreePointArc((13.935713953, -55.389471436), (13.642820734, -56.096578218), (12.935713953, -56.389471436))
            Line((12.935713953, -56.389471436), (-40.064286047, -56.389471436))
            ThreePointArc((-40.064286047, -56.389471436), (-40.771392828, -56.096578218), (-41.064286047, -55.389471436))
            Line((-41.064286047, -55.389471436), (-41.064286047, -37.389471436))
            ThreePointArc((-41.064286047, -37.389471436), (-40.771392828, -36.682364655), (-40.064286047, -36.389471436))
        make_face()
    extrude(amount=-CUT_EXTRUDE4_DEPTH, mode=Mode.SUBTRACT)

    # Sketch10 → Cut-Extrude5 (cut)
    with BuildSketch(Plane(origin=(0, 5, 0), x_dir=(1, 0, 0), z_dir=(0, 1, 0))):
        with Locations(Location((36.640221993, -5.586083109, 0), (0, 0, 270))):
            Circle(SKETCH10_R)
        with Locations(Location((86.640221993, -5.586083109, 0), (0, 0, 270))):
            Circle(SKETCH10_R)
        with Locations(Location((86.640221993, -55.586083109, 0), (0, 0, 270))):
            Circle(SKETCH10_R)
        with Locations(Location((36.640221993, -55.586083109, 0), (0, 0, 270))):
            Circle(SKETCH10_R)
    extrude(amount=-CUT_EXTRUDE5_DEPTH, mode=Mode.SUBTRACT)

    # Sketch11 → Cut-Extrude6 (cut)
    with BuildSketch(Plane(origin=(0, 5, 0), x_dir=(1, 0, 0), z_dir=(0, 1, 0))):
        with BuildLine():
            Line((32.140221993, -25.086083109), (32.140221993, -119.086083109))
            ThreePointArc((32.140221993, -119.086083109), (30.640221993, -120.586083109), (29.140221993, -119.086083109))
            Line((29.140221993, -119.086083109), (29.140221993, -25.086083109))
            ThreePointArc((29.140221993, -25.086083109), (30.640221993, -23.586083109), (32.140221993, -25.086083109))
        make_face()
        with BuildLine():
            Line((91.140221993, -25.086083109), (91.140221993, -119.086083109))
            ThreePointArc((91.140221993, -119.086083109), (92.640221993, -120.586083109), (94.140221993, -119.086083109))
            Line((94.140221993, -119.086083109), (94.140221993, -25.086083109))
            ThreePointArc((94.140221993, -25.086083109), (92.640221993, -23.586083109), (91.140221993, -25.086083109))
        make_face()
    extrude(amount=-CUT_EXTRUDE6_DEPTH, mode=Mode.SUBTRACT)

    # Sketch12 → Cut-Extrude7 (cut)
    with BuildSketch(Plane(origin=(0, 5, 0), x_dir=(1, 0, 0), z_dir=(0, 1, 0))):
        with BuildLine():
            Line((22.394580423, -97.440920872), (8.394580423, -97.440920872))
            ThreePointArc((8.394580423, -97.440920872), (7.687473642, -97.148027653), (7.394580423, -96.440920872))
            Line((7.394580423, -96.440920872), (7.394580423, -88.440920872))
            ThreePointArc((7.394580423, -88.440920872), (7.687473642, -87.733814091), (8.394580423, -87.440920872))
            Line((8.394580423, -87.440920872), (22.394580423, -87.440920872))
            ThreePointArc((22.394580423, -87.440920872), (23.101687204, -87.733814091), (23.394580423, -88.440920872))
            Line((23.394580423, -88.440920872), (23.394580423, -96.440920872))
            ThreePointArc((23.394580423, -96.440920872), (23.101687204, -97.148027653), (22.394580423, -97.440920872))
        make_face()
        with BuildLine():
            Line((100.885863564, -87.440920872), (114.885863564, -87.440920872))
            ThreePointArc((114.885863564, -87.440920872), (115.592970345, -87.733814091), (115.885863564, -88.440920872))
            Line((115.885863564, -88.440920872), (115.885863564, -96.440920872))
            ThreePointArc((115.885863564, -96.440920872), (115.592970345, -97.148027653), (114.885863564, -97.440920872))
            Line((114.885863564, -97.440920872), (100.885863564, -97.440920872))
            ThreePointArc((100.885863564, -97.440920872), (100.178756783, -97.148027653), (99.885863564, -96.440920872))
            Line((99.885863564, -96.440920872), (99.885863564, -88.440920872))
            ThreePointArc((99.885863564, -88.440920872), (100.178756783, -87.733814091), (100.885863564, -87.440920872))
        make_face()
    extrude(amount=-CUT_EXTRUDE7_DEPTH, mode=Mode.SUBTRACT)


solid = part.part
